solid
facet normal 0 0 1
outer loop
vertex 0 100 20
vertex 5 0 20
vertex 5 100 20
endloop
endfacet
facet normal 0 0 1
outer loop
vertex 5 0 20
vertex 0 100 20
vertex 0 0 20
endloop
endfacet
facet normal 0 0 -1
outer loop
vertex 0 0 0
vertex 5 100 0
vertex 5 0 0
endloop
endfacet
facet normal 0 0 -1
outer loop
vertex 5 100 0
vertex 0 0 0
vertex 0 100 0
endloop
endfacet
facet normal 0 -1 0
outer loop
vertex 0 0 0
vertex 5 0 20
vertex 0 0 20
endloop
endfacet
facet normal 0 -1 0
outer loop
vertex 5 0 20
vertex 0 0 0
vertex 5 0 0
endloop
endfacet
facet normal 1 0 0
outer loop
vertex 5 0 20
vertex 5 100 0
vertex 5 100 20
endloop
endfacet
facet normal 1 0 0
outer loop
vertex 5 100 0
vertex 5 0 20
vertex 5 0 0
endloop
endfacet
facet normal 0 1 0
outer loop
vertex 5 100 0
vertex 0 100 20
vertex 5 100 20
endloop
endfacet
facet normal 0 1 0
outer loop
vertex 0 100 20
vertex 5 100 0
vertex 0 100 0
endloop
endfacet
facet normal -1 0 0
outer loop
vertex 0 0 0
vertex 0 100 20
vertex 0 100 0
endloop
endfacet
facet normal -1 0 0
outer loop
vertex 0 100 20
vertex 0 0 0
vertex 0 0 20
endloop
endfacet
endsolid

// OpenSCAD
// -*- mode: SCAD ; c-file-style: "ellemtel" ; coding: utf-8 -*-
//
// German craftsperson-style bottle opener
//
// © 2018–2019 Roland Sieker <ospalh@gmail.com>
// Licence: CC-BY-SA 4.0 (this file only)

/* [Global] */

// Set this to “render” and click on “Create Thing” when done with the setup.
preview = 1; // [0:render, 1:preview]

/* [Sizes] */

// bla bla
size_x = 5;  // [1:0.1:20]
size_y = 100;  // [50:0.1:40]
size_z = 20;  // [1:0.1:40]

/* [Hidden] */

// Done with the customizer

// *******************************************************
// Extra parameters. These can be changed reasonably safely.



w = 1.8;  // Wall width
p = 1.2;  // Bottom, top plate hight
c = 0.4;  // Clearance
angle = 60; // Overhangs much below 60° are a problem for me

// *******************************************************
// Some shortcuts. These shouldn’t be changed

// … to preview. You will get all parts as separate STLs when you click “Create Thing”.
part = "b"; // [s: Set, a: Part A, b: Bottle opener]
// This usually belongs further up, but i put it here for this part


tau = 2 * PI;  // π is still wrong. τ = circumference / r

xy_factor = 1/tan(angle);
// To get from a hight to a horizontal width inclined correctly
z_factor = tan(angle);  // The other way around


some_distance = 50;
ms = 0.01;  // Muggeseggele.

// fn for differently sized objects and fs, fa; all for preview or rendering.
pna = 40;
pnb = 15;
pa = 5;
ps = 1;
rna = 180;
rnb = 30;
ra = 2;
rs = 0.25;
function na() = (preview) ? pna : rna;
function nb() = (preview) ? pnb : rnb;
$fs = (preview) ? ps : rs;
$fa = (preview) ? pa : ra;

// *******************************************************
// End setup



// *******************************************************
// Generate the parts

print_part();


if ("s" == part)
{
   preview_parts();
}

if ("st" == part)
{
   // Use "st" during development
   stack_parts();
}

module print_part()
{
   if ("a" == part)
   {
      part_a();
   }
   if ("b" == part)
   {
      bottle_opener();
   }
}

module preview_parts()
{
   part_a();
   translate([some_distance, 0, 0])
   {
      bottle_opener();
   }
}

module stack_parts()
{
   // intersection()
   {
      color("yellow")
      {
         part_a();
      }
      translate([0,0,30])
      {
         color("red")
         {
            bottle_opener();
         }
      }
   }
}

// *******************************************************
// Code for the parts themselves


module bottle_opener()
{
   cube([size_x, size_y, size_z]);
}
